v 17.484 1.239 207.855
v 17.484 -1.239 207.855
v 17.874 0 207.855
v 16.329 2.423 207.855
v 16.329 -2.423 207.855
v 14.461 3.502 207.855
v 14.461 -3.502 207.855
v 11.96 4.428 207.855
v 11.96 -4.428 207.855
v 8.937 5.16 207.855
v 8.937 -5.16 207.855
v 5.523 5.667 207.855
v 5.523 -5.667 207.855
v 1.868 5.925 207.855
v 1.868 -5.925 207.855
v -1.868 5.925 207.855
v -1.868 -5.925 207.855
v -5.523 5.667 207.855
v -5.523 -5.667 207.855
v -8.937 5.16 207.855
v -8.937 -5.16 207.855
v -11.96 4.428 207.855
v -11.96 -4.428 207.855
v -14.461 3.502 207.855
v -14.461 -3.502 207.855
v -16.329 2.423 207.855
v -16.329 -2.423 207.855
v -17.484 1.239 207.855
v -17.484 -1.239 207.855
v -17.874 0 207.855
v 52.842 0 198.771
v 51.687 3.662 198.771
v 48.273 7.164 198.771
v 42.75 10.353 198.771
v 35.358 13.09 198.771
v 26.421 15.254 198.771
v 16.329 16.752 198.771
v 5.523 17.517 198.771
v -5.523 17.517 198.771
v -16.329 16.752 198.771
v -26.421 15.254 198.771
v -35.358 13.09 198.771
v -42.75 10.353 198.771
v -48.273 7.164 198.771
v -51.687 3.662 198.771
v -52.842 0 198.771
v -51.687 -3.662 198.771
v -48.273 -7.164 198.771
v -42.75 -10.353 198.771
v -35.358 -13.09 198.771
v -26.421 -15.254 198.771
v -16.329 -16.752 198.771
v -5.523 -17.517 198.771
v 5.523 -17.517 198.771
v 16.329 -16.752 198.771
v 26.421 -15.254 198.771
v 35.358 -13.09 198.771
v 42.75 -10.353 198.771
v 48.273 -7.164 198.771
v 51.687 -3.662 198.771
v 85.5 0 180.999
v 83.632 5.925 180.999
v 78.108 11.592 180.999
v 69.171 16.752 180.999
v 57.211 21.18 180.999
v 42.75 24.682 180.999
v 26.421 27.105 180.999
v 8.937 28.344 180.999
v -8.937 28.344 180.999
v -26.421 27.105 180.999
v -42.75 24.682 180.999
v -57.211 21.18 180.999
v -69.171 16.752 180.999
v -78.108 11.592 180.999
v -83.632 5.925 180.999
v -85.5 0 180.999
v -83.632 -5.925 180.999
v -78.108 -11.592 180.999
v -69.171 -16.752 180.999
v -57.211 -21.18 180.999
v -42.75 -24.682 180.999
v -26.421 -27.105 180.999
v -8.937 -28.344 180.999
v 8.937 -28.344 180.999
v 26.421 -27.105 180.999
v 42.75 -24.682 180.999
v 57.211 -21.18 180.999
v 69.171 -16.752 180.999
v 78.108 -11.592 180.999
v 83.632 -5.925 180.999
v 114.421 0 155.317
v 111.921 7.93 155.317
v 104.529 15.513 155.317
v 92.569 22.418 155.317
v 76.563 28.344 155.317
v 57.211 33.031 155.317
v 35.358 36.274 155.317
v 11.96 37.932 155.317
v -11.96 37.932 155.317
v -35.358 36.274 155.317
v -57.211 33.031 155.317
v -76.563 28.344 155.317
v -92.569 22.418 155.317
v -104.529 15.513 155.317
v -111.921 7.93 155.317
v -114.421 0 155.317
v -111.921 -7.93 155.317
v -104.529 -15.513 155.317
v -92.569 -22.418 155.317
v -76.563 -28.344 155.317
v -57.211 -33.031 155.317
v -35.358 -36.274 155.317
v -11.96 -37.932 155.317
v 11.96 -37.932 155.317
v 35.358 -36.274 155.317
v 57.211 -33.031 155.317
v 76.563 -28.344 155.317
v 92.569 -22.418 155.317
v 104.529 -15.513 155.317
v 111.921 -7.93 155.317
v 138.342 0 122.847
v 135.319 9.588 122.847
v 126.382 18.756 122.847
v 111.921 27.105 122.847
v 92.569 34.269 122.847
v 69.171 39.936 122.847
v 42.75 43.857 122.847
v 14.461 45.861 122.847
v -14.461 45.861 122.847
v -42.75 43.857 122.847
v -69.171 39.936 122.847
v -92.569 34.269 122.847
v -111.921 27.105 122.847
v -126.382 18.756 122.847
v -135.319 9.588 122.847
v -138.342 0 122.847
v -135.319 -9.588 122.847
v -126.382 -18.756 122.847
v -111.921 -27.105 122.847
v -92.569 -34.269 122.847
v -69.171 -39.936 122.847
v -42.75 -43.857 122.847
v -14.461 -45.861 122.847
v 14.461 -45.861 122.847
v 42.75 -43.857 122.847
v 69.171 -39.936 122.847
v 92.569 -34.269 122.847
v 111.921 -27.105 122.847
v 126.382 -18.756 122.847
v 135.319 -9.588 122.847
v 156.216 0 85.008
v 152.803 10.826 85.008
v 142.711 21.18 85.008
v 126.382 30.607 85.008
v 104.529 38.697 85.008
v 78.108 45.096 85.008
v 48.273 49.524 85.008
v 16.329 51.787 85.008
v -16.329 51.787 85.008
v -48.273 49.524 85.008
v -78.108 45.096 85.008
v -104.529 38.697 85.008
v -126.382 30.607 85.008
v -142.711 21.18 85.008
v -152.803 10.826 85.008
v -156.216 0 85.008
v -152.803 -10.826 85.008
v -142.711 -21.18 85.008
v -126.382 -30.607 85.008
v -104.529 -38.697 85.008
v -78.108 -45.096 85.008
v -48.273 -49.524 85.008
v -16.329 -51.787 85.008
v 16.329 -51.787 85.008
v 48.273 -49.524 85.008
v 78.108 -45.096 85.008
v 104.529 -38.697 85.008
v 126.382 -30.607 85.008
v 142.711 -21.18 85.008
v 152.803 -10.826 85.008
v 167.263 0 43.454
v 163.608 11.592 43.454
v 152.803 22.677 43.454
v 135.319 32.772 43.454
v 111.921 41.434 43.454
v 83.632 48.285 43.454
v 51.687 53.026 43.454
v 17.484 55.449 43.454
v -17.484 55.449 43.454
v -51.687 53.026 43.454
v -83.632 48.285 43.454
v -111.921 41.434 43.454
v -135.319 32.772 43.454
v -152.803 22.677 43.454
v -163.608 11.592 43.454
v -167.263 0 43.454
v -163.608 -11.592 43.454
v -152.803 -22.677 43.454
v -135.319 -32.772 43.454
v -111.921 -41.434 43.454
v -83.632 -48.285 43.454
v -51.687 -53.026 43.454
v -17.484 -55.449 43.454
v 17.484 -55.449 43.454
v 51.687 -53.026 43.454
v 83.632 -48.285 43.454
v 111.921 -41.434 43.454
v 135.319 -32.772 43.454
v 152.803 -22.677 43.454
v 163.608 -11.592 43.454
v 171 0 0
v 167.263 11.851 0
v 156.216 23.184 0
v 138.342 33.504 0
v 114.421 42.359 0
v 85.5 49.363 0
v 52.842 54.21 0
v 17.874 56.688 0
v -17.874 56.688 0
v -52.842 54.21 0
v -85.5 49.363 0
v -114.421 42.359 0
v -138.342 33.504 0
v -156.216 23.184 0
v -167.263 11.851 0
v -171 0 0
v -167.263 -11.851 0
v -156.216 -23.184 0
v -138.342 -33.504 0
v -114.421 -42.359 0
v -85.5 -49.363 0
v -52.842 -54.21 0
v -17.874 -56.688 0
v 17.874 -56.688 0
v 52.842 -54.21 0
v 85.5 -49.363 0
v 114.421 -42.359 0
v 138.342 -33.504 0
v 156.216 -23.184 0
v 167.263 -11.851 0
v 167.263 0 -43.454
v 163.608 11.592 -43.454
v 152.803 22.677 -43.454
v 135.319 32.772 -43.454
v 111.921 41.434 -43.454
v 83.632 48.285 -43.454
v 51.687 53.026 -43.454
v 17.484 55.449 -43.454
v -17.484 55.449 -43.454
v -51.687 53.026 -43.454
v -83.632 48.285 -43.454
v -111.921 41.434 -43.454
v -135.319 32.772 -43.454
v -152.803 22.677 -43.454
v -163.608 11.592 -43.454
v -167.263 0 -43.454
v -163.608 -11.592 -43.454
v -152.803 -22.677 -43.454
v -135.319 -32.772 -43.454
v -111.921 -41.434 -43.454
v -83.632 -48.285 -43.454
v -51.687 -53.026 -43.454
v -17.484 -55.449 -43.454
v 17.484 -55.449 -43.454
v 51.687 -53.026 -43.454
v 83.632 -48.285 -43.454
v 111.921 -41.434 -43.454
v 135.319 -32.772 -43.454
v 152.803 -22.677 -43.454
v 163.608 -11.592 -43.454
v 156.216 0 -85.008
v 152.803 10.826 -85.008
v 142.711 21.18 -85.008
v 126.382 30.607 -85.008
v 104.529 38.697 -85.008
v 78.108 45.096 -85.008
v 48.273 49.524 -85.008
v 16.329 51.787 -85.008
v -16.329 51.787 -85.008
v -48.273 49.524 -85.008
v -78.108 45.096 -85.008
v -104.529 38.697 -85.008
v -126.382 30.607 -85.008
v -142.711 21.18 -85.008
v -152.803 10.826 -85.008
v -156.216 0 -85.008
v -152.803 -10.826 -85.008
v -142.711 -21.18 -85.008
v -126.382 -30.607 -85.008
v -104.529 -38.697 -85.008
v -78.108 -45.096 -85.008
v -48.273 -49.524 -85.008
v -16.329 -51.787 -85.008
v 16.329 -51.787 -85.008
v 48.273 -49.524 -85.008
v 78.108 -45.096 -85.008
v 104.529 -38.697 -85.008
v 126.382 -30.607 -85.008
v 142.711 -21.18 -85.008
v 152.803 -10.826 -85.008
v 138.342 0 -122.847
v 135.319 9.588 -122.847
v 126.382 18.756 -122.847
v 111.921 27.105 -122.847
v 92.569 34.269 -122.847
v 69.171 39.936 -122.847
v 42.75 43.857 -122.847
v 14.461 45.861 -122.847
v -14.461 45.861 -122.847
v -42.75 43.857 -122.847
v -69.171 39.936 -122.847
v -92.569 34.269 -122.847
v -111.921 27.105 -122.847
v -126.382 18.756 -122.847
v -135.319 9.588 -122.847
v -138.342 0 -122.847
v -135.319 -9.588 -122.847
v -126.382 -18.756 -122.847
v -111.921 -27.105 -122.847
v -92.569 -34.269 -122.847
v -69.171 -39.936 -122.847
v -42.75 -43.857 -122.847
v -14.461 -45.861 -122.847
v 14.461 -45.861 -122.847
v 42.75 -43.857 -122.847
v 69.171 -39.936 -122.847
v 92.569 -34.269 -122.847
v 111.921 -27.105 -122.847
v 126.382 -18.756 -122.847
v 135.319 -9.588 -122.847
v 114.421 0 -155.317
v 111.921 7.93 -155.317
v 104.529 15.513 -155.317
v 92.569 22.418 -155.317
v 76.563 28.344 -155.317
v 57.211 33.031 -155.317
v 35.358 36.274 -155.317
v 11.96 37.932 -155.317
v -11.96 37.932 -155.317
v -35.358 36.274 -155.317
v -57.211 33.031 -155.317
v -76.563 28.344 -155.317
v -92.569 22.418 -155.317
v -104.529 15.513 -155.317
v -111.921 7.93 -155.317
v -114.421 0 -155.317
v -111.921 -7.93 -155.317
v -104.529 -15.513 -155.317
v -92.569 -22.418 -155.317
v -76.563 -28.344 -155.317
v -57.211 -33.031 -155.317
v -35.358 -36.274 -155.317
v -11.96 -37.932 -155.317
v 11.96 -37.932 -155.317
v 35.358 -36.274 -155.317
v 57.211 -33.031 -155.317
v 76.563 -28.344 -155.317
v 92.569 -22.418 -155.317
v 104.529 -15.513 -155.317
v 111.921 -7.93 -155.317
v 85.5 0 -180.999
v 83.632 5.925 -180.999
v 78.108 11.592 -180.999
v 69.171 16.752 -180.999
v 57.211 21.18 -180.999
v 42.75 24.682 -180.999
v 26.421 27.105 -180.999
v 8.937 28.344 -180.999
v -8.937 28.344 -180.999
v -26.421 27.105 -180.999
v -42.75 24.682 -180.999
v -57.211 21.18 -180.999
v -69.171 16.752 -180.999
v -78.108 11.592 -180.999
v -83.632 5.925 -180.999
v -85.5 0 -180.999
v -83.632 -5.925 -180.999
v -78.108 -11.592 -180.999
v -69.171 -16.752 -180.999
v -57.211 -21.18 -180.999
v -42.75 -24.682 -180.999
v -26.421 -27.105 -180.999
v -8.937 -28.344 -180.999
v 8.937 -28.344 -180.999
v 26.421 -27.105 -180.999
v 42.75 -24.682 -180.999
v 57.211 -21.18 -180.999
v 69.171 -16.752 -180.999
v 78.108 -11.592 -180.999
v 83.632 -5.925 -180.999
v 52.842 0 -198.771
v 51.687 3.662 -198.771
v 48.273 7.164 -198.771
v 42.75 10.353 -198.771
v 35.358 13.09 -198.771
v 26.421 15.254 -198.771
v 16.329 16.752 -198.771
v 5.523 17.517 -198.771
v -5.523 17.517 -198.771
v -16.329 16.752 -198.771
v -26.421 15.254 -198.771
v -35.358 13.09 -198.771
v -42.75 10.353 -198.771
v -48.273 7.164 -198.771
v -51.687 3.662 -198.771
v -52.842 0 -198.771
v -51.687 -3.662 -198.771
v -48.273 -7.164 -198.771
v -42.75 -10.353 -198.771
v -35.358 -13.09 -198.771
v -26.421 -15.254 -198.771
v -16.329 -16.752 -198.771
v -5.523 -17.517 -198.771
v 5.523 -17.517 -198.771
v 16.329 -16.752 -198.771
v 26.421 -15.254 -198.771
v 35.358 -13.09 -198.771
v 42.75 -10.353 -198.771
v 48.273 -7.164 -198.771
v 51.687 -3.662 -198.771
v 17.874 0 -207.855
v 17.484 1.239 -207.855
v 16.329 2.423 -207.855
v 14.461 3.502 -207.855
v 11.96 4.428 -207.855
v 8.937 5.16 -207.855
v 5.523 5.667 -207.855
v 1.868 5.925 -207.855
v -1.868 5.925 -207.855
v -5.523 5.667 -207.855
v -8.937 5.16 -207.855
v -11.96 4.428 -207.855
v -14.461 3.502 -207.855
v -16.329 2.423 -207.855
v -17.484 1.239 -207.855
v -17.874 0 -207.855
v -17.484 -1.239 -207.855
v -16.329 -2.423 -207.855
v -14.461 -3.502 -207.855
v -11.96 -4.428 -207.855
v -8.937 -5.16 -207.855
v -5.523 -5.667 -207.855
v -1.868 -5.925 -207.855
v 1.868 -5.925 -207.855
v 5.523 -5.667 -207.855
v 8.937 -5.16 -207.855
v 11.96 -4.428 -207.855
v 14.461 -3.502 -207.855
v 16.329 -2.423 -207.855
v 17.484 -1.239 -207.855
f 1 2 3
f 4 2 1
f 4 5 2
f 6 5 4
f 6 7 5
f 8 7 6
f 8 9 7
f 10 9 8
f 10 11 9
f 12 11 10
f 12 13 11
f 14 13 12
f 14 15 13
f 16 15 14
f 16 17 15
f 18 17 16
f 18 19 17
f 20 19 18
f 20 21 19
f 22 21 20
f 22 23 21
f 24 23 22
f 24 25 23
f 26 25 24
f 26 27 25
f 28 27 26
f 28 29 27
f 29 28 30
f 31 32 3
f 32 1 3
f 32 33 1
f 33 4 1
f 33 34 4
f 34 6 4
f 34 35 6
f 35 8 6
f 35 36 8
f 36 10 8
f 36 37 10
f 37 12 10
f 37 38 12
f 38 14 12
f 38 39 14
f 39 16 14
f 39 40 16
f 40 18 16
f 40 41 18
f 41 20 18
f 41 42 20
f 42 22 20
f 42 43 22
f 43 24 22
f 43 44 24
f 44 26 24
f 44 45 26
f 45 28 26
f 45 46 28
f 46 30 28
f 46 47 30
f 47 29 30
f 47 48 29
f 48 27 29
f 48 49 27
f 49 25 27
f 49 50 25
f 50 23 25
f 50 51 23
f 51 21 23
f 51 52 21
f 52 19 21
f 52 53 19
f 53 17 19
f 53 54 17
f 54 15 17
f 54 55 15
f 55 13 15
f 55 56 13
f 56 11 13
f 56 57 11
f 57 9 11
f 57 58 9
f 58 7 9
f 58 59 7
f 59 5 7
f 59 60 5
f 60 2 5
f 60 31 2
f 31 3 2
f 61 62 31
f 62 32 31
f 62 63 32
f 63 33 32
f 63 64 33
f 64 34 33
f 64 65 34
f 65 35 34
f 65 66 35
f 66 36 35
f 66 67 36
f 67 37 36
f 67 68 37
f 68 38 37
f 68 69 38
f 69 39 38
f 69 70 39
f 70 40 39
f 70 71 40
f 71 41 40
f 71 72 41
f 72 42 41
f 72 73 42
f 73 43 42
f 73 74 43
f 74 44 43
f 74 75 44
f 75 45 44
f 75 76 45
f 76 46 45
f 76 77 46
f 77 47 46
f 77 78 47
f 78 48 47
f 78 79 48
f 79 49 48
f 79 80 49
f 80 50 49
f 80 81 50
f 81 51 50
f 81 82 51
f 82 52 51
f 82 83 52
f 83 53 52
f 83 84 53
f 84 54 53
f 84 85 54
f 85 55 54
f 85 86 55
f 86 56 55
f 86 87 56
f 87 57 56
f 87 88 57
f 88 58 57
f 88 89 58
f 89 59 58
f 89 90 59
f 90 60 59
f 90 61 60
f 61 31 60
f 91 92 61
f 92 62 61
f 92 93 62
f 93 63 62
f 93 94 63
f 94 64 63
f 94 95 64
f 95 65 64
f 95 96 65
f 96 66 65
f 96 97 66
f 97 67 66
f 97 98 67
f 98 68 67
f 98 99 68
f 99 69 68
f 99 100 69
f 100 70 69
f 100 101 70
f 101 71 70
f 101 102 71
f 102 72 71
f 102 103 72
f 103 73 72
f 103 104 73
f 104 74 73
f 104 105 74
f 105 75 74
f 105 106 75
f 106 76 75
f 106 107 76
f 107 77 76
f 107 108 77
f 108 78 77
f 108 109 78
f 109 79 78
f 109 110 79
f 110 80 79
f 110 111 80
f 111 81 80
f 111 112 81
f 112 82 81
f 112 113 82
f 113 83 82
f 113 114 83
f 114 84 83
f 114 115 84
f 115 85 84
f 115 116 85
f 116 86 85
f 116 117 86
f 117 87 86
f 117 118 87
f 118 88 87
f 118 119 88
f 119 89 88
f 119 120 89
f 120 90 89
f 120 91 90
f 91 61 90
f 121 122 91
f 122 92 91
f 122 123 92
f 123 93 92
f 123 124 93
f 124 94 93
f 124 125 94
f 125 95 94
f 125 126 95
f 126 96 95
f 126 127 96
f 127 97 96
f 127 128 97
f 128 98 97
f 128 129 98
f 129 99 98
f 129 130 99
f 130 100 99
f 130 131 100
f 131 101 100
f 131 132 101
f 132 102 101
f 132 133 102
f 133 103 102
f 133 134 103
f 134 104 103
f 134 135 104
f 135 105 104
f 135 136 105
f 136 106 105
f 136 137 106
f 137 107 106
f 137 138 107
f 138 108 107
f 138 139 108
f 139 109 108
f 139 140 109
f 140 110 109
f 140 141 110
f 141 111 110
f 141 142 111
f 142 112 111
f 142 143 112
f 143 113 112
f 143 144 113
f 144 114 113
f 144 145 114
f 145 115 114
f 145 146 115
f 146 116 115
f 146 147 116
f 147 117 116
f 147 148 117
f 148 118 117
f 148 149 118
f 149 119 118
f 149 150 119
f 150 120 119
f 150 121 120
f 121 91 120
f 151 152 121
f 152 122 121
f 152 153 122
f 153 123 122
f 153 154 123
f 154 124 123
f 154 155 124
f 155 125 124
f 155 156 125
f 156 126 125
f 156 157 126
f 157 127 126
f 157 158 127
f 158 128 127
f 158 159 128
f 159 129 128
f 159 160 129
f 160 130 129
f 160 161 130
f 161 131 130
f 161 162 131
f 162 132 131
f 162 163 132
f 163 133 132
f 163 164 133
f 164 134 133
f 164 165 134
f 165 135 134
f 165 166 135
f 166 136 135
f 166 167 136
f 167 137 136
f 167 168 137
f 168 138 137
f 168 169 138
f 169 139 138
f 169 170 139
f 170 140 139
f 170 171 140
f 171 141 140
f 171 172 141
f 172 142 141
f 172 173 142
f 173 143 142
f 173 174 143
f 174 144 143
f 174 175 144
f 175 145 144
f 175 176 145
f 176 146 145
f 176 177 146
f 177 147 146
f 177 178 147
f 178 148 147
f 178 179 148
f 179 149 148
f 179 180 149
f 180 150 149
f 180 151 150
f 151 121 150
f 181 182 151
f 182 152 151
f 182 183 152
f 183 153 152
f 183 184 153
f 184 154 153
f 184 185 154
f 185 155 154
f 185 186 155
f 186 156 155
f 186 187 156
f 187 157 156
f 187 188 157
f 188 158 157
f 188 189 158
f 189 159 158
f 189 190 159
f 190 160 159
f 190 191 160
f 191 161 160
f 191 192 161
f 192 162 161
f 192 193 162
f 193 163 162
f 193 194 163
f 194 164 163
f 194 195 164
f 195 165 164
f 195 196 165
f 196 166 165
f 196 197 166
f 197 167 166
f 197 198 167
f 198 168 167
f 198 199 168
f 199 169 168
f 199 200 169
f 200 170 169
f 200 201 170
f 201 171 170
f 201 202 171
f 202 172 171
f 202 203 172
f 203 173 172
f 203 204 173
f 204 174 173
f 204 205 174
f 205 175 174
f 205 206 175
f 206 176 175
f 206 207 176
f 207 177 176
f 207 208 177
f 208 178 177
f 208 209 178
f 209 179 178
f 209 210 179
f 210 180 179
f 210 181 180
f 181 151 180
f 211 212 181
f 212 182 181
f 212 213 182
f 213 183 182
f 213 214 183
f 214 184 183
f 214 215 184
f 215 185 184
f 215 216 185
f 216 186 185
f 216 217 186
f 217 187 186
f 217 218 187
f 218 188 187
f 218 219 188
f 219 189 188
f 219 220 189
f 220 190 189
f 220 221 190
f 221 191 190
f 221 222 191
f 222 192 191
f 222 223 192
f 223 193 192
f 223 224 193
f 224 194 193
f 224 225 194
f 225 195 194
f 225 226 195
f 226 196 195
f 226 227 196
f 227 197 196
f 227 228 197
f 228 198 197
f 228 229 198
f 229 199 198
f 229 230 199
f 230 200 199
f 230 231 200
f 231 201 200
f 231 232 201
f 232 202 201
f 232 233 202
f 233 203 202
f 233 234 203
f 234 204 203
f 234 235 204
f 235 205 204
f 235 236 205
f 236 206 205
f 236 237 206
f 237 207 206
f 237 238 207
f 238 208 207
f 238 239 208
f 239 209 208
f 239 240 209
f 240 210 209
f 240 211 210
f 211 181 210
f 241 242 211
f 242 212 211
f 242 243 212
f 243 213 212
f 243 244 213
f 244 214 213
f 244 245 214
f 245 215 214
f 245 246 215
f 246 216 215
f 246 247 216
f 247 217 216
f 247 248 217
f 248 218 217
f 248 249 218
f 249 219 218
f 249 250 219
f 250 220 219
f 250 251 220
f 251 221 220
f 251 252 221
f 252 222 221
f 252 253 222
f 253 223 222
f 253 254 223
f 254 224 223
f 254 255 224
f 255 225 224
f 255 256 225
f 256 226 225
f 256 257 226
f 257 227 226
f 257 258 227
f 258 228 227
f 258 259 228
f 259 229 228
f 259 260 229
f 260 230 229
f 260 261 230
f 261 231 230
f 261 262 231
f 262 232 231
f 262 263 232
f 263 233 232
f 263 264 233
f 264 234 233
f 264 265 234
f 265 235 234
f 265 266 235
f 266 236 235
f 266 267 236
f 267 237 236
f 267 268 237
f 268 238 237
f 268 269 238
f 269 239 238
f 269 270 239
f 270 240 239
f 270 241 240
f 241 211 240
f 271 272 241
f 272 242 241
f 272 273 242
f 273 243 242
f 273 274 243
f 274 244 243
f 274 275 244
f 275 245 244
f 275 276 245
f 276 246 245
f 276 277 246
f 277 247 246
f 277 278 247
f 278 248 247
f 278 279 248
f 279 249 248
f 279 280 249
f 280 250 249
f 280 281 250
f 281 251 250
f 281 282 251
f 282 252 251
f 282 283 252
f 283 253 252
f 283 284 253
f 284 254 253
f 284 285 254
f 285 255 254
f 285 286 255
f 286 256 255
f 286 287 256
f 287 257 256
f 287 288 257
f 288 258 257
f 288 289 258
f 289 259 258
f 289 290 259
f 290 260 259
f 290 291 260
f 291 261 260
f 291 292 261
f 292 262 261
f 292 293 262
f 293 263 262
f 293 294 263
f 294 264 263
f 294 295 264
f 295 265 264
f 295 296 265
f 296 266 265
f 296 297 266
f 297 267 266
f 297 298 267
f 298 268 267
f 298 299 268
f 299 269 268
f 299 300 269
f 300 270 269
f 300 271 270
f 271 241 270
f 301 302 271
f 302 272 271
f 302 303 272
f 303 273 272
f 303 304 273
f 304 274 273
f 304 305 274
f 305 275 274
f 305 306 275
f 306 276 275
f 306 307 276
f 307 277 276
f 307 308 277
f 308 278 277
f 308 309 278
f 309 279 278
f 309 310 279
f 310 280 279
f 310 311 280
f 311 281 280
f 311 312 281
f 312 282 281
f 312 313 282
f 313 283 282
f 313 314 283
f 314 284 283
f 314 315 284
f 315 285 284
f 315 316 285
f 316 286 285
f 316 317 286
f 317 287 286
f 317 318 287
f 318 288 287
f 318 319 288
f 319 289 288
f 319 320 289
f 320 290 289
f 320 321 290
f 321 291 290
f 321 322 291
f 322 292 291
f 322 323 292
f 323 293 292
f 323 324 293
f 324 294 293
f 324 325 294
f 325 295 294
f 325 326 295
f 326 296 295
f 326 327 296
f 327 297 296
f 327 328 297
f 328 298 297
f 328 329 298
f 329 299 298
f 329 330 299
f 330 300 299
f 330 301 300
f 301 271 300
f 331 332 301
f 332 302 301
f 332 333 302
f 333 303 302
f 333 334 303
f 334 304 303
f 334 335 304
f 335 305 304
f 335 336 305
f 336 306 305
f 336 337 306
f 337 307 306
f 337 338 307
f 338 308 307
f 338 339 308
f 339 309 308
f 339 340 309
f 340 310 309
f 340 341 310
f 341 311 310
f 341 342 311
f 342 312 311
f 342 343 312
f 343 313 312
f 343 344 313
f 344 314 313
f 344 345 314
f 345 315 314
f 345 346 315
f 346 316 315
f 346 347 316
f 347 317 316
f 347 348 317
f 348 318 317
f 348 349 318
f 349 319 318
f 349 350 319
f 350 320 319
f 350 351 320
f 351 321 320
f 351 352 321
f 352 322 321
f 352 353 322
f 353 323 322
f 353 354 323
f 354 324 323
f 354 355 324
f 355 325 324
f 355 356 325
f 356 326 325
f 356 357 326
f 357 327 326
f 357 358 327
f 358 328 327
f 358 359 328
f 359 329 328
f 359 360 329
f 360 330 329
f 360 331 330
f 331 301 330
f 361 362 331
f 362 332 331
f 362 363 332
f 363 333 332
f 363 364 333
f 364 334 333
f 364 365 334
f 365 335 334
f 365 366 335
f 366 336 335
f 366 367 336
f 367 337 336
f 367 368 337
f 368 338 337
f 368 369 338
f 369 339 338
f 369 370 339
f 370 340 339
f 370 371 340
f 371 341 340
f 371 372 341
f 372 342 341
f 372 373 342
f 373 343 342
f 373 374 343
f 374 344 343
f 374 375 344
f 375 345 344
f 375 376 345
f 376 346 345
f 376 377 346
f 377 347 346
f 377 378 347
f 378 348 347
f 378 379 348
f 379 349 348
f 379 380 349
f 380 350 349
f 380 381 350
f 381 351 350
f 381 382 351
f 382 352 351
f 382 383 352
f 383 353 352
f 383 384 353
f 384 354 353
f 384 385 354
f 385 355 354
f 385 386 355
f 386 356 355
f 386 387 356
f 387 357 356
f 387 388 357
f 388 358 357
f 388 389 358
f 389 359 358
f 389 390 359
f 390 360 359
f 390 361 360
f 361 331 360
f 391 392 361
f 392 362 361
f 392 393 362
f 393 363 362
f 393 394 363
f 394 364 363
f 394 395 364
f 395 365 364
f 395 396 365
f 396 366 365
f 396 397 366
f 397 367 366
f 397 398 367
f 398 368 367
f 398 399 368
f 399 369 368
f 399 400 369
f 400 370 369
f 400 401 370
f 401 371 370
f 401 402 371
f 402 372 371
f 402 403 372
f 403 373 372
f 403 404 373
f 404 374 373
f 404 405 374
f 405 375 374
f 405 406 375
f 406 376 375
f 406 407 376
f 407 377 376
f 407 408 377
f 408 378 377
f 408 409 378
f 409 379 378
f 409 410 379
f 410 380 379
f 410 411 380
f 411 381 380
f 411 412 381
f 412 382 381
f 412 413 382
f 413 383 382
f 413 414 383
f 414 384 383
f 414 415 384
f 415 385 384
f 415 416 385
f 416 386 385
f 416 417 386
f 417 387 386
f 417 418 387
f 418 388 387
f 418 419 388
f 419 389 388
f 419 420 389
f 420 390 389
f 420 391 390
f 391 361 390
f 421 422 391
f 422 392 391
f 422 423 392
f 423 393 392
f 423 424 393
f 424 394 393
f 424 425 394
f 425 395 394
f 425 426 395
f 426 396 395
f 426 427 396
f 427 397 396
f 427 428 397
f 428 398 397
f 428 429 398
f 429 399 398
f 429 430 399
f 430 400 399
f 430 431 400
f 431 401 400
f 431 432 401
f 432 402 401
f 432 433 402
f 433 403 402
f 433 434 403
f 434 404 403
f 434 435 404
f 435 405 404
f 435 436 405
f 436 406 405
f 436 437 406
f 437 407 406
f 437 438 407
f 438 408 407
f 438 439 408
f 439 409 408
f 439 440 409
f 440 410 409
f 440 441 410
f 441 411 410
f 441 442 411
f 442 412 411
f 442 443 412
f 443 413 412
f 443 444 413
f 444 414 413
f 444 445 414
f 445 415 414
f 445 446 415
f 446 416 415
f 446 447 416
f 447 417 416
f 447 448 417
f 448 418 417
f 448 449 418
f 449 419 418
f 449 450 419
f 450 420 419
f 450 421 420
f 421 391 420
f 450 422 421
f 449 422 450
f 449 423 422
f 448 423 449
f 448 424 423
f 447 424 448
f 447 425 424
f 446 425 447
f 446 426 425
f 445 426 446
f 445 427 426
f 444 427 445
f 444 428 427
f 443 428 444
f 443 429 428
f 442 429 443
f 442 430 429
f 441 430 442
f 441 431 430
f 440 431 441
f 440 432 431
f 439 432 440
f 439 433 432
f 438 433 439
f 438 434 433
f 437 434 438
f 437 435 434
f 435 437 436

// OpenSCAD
// Generated by SolidPython 1.0.1 on 2020-07-29 00:46:48


scale(v = [9, 3, 11]) {
	sphere(r = 19);
}
/***********************************************
*********      SolidPython code:      **********
************************************************
 
# import packages: SolidPython
from solid import *
from solid.utils import *
from itertools import chain, combinations, permutations


class Resize:

    def __init__(self, scad_file):
        self.scad_file = scad_file
        #self.scad_file = import_scad(scad_file)
        # cone/cylinder param:
        self.r1 = 0
        self.r2 = 0
        self.h = 0
        # rectangular prism param:
        self.w = 0
        self.l = 0
        # ellipse param:
        self.r = 0

    # import OpenScad code (file name corresponds to shape)


    # classify shape + parameters
    def assign(self, param1, param2, param3):
        if self.scad_file == 'cone.scad':
            self.r1 = param1
            self.r2 = param2
            self.h = param3
        elif self.scad_file == 'cylinder.scad':
            self.r1 = param1
            self.r2 = param2
            self.h = param3
        elif self.scad_file == 'rectangularPrism.scad':
            self.h = param1
            self.l = param2
            self.w = param3
        else:
            self.r = param1
            self.h = param2

    # resize parameters
    def iterate(self):
        x = range(3, 20, 2)
        i = 1
        if self.scad_file == 'cone.scad':
            tempList = list(permutations(x, 2))
            for temp in tempList:
                param1 = temp[0]
                param2 = temp[1]
                filepath = 'produced_scad_files/' + 'cone' + str(param1) + '_' + str(param2) + '_' + '.scad'
                scad_render_to_file(cylinder(h=param1, r1=param2, r2=0), filepath)

        elif self.scad_file == 'cylinder.scad':
            tempList = list(permutations(x, 3))
            for temp in tempList:
                param1 = temp[0]
                param2 = temp[1]
                filepath = 'produced_scad_files/' + 'cylinder' + str(param1) + '_' + str(param2) + '_' + '.scad'
                scad_render_to_file(cylinder(h=param1, r1=param2, r2=param2), filepath)

        elif self.scad_file == 'rectangularPrism.scad':
            tempList = list(permutations(x, 3))
            for temp in tempList:
                param1 = temp[0]
                param2 = temp[1]
                param3 = temp[2]
                filepath = 'produced_scad_files/' + 'rectangularPrism' + str(param1) + '_' + str(param2) + '_' + str(
                    param3) + '.scad'
                scad_render_to_file(cube(size=(param1, param2, param3)), filepath)

        elif self.scad_file == 'ellipse.scad':
            tempList = list(permutations(x, 4))
            for temp in tempList:
                param1 = temp[0]
                param2 = temp[1]
                param3 = temp[2]
                param4 = temp[3]
                filepath = 'produced_scad_files/' + 'ellipse' + str(param1) + '_' + str(param2) + '_' + str(param3) + '_' + str(param4) + '.scad'
                scad_render_to_file(scale([param1, param2, param3])(sphere(r=param4)), filepath)

    def render_to_scadfile(self):
        scad_render_to_file(scad, 'example.scad') 
 
************************************************/
